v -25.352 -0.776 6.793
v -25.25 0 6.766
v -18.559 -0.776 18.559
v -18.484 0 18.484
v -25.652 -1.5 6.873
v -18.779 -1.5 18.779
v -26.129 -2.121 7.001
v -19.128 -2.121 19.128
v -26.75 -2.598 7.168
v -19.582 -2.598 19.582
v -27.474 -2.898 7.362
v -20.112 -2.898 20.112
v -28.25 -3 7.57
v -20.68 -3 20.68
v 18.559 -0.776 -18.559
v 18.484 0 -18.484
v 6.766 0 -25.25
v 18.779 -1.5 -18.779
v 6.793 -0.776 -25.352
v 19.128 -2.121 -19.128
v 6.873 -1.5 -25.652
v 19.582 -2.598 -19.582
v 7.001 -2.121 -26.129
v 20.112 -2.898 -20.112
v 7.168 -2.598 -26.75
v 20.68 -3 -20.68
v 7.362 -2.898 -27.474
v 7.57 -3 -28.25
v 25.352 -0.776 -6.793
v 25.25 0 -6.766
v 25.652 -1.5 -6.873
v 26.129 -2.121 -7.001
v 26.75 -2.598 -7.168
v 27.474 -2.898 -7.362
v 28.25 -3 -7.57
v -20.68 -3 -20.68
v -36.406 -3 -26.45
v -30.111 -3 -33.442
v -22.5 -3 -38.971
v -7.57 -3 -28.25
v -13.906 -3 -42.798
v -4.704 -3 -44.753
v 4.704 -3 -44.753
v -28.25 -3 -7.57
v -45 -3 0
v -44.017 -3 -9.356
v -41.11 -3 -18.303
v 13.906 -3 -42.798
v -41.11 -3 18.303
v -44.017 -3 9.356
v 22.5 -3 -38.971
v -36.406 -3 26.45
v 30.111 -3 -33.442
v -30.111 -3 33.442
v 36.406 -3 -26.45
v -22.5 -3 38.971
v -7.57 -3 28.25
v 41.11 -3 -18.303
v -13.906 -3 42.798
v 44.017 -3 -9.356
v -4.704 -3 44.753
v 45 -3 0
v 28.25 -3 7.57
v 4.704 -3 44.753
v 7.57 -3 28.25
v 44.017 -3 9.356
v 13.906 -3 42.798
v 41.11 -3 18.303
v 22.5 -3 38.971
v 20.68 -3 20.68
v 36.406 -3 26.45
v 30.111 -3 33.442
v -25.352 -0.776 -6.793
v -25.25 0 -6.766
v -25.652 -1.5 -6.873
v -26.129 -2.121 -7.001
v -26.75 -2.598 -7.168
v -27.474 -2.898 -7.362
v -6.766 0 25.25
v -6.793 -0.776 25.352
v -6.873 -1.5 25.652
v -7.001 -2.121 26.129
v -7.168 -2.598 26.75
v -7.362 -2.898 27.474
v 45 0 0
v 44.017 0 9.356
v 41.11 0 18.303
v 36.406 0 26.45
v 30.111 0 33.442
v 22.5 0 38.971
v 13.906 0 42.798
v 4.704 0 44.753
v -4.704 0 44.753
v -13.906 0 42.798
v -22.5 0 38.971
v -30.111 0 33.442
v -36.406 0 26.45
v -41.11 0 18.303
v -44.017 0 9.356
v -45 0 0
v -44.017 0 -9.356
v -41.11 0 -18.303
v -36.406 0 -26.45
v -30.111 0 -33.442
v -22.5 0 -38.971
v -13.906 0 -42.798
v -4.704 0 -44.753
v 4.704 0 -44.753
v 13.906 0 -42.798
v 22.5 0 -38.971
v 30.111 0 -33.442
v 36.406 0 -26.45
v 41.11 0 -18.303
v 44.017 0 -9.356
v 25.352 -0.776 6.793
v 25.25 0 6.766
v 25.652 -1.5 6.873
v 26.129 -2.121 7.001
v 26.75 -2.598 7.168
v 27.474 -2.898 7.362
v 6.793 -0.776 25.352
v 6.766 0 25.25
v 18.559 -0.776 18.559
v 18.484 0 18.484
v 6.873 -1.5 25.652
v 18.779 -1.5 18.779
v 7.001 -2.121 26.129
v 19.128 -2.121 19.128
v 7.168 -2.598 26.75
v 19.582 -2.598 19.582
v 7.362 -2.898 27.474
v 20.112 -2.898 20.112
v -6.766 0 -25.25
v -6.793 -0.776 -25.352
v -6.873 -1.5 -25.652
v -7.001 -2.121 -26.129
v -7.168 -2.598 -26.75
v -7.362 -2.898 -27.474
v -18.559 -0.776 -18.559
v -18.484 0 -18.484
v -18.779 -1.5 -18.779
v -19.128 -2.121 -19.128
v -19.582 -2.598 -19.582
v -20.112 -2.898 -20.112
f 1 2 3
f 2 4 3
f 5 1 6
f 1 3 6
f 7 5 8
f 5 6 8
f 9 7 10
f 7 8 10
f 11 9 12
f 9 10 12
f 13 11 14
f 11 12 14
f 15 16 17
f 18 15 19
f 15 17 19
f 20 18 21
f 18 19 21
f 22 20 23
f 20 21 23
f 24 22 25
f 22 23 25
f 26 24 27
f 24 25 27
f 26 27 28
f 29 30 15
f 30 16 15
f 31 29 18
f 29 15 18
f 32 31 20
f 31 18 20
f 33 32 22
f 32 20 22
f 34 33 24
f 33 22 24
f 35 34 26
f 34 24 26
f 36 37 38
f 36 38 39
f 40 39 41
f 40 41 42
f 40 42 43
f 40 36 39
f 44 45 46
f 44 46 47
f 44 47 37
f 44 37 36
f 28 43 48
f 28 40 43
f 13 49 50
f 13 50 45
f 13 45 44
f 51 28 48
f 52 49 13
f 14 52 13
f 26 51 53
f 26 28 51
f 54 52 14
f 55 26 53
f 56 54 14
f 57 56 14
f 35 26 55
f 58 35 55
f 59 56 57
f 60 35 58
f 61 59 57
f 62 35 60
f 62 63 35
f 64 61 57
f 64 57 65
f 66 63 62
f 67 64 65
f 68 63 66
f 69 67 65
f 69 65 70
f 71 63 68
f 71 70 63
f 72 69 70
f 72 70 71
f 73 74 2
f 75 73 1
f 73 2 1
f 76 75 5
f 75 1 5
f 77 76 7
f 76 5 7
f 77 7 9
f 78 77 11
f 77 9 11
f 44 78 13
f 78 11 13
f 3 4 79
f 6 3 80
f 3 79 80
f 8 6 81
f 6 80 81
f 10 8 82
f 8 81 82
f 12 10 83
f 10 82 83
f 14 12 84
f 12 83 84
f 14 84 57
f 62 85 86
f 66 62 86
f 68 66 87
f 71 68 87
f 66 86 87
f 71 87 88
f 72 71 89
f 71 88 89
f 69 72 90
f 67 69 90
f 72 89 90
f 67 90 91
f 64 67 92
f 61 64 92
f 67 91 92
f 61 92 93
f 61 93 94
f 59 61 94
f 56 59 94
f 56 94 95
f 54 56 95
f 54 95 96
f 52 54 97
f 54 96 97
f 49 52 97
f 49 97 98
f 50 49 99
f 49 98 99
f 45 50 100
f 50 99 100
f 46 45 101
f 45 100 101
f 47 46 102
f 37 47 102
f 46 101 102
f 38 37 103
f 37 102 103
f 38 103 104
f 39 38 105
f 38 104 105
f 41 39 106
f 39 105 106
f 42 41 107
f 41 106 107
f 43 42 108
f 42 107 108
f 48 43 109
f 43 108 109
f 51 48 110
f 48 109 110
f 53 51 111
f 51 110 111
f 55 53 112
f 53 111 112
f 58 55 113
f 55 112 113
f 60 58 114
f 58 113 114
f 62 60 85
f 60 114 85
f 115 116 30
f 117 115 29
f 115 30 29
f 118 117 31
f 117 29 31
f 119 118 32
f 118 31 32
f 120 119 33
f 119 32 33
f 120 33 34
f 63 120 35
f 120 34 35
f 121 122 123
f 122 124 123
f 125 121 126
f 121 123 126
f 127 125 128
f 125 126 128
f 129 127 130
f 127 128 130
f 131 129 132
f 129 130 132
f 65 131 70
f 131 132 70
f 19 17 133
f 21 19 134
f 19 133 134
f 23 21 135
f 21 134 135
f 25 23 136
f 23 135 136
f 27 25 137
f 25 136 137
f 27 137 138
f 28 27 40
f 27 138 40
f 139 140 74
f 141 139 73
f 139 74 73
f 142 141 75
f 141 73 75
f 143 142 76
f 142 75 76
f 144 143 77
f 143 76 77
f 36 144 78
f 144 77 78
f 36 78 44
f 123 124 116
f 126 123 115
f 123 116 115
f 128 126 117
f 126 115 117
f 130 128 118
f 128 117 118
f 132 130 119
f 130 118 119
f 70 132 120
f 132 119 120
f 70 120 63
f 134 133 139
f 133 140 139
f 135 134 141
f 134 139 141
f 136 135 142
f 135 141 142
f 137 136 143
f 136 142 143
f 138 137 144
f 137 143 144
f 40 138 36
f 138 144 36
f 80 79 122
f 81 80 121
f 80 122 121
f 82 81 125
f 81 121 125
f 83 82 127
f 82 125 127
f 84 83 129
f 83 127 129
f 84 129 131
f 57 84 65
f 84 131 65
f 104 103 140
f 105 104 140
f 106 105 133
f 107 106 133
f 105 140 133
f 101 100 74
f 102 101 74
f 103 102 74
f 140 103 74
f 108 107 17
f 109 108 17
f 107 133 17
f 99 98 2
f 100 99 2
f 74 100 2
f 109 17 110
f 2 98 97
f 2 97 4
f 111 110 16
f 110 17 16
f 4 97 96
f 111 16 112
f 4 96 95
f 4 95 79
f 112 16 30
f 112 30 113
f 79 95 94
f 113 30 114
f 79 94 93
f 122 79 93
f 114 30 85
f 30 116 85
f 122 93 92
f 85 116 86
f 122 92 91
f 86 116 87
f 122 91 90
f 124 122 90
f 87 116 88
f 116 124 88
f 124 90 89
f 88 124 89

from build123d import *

# Parameters (mm, degrees)
F0_R     = 45
F1_DEPTH = 3
F2_R     = 2.99999


# Not quite as in the source:
# - a fillet or chamfer is up to 0.001 mm smaller than in the source, because OpenCascade refuses the exact size


with BuildPart() as f1:
    # F0 (on Front) → F1 (new body)
    with BuildSketch(Plane.XZ):
        Circle(F0_R)
        Polygon((-18.4842828911, 18.4842828911), (-6.7657171089, 25.25), (6.7657171089, 25.25), (18.4842828911, 18.4842828911), (25.25, 6.7657171089), (25.25, -6.7657171089), (18.4842828911, -18.4842828911), (6.7657171089, -25.25), (-6.7657171089, -25.25), (-18.4842828911, -18.4842828911), (-25.25, -6.7657171089), (-25.25, 6.7657171089), align=None, mode=Mode.SUBTRACT)
    extrude(amount=F1_DEPTH)

    # F2 (radius 3 in the source; OpenCascade refuses exactly that, so slightly less here)
    f2_edges = [f1.edges().sort_by_distance(p)[0] for p in [
        (-12.625, -3, 21.867141),
        (-21.867141, -3, 12.625),
        (-25.25, -3, 0),
        (-21.867141, -3, -12.625),
        (-12.625, -3, -21.867141),
        (0, -3, -25.25),
        (12.625, -3, -21.867141),
        (21.867141, -3, -12.625),
        (25.25, -3, 0),
        (21.867141, -3, 12.625),
        (12.625, -3, 21.867141),
        (0, -3, 25.25),
    ]]
    fillet(f2_edges, radius=F2_R)


solid = f1.part
